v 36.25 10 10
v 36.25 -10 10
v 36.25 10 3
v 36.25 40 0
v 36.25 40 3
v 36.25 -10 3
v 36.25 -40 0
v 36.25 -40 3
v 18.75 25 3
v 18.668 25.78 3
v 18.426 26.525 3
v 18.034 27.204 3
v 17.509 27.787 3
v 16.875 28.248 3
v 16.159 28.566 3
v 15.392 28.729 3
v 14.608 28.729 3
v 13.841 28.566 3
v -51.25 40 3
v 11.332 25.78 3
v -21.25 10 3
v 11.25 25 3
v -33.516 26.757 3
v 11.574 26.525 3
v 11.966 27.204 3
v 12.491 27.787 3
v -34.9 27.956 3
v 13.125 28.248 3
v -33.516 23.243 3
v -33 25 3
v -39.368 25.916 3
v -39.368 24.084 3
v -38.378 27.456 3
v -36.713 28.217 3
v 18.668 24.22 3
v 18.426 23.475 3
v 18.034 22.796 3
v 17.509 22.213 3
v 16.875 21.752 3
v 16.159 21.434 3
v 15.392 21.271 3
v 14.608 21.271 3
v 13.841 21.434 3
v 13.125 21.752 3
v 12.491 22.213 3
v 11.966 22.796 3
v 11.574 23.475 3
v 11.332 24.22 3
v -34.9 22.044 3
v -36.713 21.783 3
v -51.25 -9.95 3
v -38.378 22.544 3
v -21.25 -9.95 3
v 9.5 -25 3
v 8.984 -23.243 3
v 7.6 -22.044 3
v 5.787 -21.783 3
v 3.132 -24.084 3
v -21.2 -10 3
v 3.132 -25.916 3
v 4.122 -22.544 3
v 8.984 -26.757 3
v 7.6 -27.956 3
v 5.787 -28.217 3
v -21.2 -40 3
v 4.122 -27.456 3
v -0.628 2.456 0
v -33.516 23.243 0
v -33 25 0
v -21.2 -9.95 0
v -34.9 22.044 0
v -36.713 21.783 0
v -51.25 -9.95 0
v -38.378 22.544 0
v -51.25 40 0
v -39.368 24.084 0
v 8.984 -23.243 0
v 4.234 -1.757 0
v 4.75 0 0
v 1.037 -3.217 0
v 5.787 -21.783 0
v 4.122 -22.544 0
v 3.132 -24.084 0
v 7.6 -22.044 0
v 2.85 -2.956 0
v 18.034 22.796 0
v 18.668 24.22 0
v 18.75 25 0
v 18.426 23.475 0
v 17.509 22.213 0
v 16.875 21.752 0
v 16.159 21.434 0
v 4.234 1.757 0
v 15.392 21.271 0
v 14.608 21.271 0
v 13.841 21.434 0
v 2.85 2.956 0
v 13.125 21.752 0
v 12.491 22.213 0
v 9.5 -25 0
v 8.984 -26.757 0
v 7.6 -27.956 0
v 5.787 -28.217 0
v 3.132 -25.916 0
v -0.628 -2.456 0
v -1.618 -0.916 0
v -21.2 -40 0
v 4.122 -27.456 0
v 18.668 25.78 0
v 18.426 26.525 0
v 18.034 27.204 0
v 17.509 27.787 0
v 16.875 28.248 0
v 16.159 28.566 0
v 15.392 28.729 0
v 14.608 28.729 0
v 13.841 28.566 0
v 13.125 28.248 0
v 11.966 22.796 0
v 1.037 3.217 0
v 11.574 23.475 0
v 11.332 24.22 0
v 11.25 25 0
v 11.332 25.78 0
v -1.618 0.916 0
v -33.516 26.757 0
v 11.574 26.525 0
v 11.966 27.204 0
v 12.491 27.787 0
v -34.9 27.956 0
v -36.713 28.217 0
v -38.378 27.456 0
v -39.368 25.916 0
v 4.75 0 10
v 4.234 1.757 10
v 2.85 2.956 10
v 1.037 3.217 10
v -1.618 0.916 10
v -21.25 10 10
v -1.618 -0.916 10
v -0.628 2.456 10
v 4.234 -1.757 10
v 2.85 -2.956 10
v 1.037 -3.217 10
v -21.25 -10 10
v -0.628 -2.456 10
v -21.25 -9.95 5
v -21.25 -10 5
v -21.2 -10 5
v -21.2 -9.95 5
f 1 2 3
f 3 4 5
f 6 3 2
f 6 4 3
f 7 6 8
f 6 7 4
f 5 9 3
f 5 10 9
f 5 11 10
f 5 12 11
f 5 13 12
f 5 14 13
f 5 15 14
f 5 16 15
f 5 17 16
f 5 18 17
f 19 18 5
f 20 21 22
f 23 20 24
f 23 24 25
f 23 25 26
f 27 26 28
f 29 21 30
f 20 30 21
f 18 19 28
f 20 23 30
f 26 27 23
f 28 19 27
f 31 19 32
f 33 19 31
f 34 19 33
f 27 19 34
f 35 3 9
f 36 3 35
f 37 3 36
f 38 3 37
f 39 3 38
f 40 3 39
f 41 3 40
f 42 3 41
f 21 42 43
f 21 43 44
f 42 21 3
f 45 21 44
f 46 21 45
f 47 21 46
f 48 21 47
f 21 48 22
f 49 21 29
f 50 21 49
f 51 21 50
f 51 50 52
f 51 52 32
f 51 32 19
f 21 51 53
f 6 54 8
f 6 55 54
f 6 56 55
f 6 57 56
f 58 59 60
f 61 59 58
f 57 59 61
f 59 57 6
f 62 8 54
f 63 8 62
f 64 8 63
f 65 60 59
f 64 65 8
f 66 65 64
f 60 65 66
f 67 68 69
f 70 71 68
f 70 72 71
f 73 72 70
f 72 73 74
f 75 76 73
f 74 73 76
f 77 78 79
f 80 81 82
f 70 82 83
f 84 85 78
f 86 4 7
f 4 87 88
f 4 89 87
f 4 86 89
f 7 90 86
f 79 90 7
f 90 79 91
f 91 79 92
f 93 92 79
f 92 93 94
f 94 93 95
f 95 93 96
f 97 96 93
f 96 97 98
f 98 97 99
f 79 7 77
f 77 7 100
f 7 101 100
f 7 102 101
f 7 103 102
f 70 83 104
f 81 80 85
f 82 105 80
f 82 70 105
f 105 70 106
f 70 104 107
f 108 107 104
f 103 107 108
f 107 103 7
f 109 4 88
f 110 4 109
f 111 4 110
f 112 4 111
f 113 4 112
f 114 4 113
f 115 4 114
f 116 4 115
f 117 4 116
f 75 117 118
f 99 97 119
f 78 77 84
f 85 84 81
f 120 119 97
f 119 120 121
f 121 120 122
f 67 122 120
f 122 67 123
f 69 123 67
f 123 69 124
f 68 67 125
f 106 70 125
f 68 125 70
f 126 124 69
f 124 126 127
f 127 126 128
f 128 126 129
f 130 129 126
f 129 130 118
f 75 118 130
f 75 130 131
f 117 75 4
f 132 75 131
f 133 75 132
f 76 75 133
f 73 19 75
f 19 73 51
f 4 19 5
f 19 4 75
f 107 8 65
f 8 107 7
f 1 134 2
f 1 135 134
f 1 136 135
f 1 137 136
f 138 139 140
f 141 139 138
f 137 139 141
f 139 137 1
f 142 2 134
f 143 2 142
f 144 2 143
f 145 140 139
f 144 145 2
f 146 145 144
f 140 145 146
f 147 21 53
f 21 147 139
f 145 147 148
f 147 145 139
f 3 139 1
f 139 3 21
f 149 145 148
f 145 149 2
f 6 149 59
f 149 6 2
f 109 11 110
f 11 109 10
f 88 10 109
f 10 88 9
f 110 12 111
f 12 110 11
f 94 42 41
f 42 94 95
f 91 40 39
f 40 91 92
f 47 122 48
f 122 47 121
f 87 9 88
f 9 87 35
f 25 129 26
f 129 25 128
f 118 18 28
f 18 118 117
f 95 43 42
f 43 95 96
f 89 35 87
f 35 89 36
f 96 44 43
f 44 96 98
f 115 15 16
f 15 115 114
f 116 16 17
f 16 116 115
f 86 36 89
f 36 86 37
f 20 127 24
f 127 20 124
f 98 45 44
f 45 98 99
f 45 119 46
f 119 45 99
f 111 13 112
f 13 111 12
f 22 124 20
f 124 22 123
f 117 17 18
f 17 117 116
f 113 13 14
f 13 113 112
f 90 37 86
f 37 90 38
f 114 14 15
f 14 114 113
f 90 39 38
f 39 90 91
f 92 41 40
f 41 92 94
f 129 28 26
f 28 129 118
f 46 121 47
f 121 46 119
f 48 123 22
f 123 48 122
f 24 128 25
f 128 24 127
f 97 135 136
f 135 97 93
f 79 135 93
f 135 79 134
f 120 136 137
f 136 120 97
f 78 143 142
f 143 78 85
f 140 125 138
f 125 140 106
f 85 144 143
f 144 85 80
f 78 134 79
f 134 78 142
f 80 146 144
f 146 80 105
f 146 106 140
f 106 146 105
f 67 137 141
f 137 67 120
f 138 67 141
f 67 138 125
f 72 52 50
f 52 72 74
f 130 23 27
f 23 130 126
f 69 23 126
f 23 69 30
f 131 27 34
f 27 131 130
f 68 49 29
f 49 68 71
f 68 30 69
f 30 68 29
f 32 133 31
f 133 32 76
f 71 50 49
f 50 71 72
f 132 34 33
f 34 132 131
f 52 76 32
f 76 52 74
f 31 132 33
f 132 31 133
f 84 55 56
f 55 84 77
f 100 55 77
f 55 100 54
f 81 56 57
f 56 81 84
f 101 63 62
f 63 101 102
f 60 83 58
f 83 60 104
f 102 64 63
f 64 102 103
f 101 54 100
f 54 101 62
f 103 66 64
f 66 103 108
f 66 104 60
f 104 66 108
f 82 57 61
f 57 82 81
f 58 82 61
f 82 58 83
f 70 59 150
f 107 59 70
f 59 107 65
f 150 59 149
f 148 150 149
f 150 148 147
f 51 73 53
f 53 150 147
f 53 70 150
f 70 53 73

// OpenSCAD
SirkaProfilu = 30;
NX17_mount_width = 42.5;


/*
** 0 - AlProfil Width
** 1 - NX17 mount width
** 2 - idler bearing diameter
** 3 - belt guide diameter
** 4 - mount screw diameter
** 5 - height 1
** 6 - height 2
** 7 - belt width
** 8 - delta
*/
cc_with_bearing_params = [30, 50, 15, 12,6,3,10,1.5,0.5];

function cc_bearing_idler_get_al_profil_width(self)=self[0];
function cc_bearing_idler_get_nx17_mount_width(self)=self[1];
function cc_bearing_idler_get_bearing_diameter(self)=self[2];
function cc_bearing_idler_get_belt_guide_diameter(self)=self[3];
function cc_bearing_idler_get_mount_screw_diameter(self)=self[4];
function cc_bearing_idler_get_height_1(self)=self[5];
function cc_bearing_idler_get_height_2(self)=self[6];
function cc_bearing_idler_get_delta(self)=self[7];


function cc_bearing_idler_get_mount_screw_diameter_with_delta(self)=self[4]+self[7];



module corner_coupler_with_bearing_idler_holes(self)
{
	bearing_diameter= 15;
    belt_guide_diameter=12;
	
	/* je třeba započítat tloušťku řemene, přítlačné ložisko 2 */
	translate([(bearing_diameter+belt_guide_diameter)/2+1.5,10+SirkaProfilu/2,0])
	{
		cylinder(d=cc_bearing_idler_get_mount_screw_diameter_with_delta(self),
				h=cc_bearing_idler_get_height_2(self)*3,
				center=true,
				$fn=30);
	}
	
	/* přítlačné ložisko 1 */
	 translate([(bearing_diameter-belt_guide_diameter)/2,0,0])
		cylinder(d=6.5, h=20,center=true);
	
	
	
	
	translate([-SirkaProfilu-NX17_mount_width/2+SirkaProfilu/2,SirkaProfilu/2+10,0])
		cylinder(d=6.5, h=20,center=true);
	
	translate([-((SirkaProfilu*2)-NX17_mount_width)/2+SirkaProfilu/2,-(SirkaProfilu/2+10),0])
		cylinder(d=6.5, h=20,center=true);
	
	
	translate([-(SirkaProfilu+NX17_mount_width)/2,-(2*SirkaProfilu+20)/2+SirkaProfilu/2,0])
		cube([SirkaProfilu+0.1, SirkaProfilu+0.1,10],center=true);
}

module corner_coupler_with_bearing_indler_body(self)
{
	bearing_diameter= 15;
 belt_guide_diameter=12;
            
	translate([-SirkaProfilu/4,0,1.5])
		cube([1.5*SirkaProfilu+NX17_mount_width,2*SirkaProfilu+20,3],center=true);
	
	translate([SirkaProfilu/2-SirkaProfilu/4,0,5])
		cube([SirkaProfilu/2+NX17_mount_width,20,10],center=true);
}


module corner_coupler_with_bearing_indler(self)
{
	difference()
	{
		corner_coupler_with_bearing_indler_body(self);
		corner_coupler_with_bearing_idler_holes(self);
	}
}

corner_coupler_with_bearing_indler(cc_with_bearing_params);
